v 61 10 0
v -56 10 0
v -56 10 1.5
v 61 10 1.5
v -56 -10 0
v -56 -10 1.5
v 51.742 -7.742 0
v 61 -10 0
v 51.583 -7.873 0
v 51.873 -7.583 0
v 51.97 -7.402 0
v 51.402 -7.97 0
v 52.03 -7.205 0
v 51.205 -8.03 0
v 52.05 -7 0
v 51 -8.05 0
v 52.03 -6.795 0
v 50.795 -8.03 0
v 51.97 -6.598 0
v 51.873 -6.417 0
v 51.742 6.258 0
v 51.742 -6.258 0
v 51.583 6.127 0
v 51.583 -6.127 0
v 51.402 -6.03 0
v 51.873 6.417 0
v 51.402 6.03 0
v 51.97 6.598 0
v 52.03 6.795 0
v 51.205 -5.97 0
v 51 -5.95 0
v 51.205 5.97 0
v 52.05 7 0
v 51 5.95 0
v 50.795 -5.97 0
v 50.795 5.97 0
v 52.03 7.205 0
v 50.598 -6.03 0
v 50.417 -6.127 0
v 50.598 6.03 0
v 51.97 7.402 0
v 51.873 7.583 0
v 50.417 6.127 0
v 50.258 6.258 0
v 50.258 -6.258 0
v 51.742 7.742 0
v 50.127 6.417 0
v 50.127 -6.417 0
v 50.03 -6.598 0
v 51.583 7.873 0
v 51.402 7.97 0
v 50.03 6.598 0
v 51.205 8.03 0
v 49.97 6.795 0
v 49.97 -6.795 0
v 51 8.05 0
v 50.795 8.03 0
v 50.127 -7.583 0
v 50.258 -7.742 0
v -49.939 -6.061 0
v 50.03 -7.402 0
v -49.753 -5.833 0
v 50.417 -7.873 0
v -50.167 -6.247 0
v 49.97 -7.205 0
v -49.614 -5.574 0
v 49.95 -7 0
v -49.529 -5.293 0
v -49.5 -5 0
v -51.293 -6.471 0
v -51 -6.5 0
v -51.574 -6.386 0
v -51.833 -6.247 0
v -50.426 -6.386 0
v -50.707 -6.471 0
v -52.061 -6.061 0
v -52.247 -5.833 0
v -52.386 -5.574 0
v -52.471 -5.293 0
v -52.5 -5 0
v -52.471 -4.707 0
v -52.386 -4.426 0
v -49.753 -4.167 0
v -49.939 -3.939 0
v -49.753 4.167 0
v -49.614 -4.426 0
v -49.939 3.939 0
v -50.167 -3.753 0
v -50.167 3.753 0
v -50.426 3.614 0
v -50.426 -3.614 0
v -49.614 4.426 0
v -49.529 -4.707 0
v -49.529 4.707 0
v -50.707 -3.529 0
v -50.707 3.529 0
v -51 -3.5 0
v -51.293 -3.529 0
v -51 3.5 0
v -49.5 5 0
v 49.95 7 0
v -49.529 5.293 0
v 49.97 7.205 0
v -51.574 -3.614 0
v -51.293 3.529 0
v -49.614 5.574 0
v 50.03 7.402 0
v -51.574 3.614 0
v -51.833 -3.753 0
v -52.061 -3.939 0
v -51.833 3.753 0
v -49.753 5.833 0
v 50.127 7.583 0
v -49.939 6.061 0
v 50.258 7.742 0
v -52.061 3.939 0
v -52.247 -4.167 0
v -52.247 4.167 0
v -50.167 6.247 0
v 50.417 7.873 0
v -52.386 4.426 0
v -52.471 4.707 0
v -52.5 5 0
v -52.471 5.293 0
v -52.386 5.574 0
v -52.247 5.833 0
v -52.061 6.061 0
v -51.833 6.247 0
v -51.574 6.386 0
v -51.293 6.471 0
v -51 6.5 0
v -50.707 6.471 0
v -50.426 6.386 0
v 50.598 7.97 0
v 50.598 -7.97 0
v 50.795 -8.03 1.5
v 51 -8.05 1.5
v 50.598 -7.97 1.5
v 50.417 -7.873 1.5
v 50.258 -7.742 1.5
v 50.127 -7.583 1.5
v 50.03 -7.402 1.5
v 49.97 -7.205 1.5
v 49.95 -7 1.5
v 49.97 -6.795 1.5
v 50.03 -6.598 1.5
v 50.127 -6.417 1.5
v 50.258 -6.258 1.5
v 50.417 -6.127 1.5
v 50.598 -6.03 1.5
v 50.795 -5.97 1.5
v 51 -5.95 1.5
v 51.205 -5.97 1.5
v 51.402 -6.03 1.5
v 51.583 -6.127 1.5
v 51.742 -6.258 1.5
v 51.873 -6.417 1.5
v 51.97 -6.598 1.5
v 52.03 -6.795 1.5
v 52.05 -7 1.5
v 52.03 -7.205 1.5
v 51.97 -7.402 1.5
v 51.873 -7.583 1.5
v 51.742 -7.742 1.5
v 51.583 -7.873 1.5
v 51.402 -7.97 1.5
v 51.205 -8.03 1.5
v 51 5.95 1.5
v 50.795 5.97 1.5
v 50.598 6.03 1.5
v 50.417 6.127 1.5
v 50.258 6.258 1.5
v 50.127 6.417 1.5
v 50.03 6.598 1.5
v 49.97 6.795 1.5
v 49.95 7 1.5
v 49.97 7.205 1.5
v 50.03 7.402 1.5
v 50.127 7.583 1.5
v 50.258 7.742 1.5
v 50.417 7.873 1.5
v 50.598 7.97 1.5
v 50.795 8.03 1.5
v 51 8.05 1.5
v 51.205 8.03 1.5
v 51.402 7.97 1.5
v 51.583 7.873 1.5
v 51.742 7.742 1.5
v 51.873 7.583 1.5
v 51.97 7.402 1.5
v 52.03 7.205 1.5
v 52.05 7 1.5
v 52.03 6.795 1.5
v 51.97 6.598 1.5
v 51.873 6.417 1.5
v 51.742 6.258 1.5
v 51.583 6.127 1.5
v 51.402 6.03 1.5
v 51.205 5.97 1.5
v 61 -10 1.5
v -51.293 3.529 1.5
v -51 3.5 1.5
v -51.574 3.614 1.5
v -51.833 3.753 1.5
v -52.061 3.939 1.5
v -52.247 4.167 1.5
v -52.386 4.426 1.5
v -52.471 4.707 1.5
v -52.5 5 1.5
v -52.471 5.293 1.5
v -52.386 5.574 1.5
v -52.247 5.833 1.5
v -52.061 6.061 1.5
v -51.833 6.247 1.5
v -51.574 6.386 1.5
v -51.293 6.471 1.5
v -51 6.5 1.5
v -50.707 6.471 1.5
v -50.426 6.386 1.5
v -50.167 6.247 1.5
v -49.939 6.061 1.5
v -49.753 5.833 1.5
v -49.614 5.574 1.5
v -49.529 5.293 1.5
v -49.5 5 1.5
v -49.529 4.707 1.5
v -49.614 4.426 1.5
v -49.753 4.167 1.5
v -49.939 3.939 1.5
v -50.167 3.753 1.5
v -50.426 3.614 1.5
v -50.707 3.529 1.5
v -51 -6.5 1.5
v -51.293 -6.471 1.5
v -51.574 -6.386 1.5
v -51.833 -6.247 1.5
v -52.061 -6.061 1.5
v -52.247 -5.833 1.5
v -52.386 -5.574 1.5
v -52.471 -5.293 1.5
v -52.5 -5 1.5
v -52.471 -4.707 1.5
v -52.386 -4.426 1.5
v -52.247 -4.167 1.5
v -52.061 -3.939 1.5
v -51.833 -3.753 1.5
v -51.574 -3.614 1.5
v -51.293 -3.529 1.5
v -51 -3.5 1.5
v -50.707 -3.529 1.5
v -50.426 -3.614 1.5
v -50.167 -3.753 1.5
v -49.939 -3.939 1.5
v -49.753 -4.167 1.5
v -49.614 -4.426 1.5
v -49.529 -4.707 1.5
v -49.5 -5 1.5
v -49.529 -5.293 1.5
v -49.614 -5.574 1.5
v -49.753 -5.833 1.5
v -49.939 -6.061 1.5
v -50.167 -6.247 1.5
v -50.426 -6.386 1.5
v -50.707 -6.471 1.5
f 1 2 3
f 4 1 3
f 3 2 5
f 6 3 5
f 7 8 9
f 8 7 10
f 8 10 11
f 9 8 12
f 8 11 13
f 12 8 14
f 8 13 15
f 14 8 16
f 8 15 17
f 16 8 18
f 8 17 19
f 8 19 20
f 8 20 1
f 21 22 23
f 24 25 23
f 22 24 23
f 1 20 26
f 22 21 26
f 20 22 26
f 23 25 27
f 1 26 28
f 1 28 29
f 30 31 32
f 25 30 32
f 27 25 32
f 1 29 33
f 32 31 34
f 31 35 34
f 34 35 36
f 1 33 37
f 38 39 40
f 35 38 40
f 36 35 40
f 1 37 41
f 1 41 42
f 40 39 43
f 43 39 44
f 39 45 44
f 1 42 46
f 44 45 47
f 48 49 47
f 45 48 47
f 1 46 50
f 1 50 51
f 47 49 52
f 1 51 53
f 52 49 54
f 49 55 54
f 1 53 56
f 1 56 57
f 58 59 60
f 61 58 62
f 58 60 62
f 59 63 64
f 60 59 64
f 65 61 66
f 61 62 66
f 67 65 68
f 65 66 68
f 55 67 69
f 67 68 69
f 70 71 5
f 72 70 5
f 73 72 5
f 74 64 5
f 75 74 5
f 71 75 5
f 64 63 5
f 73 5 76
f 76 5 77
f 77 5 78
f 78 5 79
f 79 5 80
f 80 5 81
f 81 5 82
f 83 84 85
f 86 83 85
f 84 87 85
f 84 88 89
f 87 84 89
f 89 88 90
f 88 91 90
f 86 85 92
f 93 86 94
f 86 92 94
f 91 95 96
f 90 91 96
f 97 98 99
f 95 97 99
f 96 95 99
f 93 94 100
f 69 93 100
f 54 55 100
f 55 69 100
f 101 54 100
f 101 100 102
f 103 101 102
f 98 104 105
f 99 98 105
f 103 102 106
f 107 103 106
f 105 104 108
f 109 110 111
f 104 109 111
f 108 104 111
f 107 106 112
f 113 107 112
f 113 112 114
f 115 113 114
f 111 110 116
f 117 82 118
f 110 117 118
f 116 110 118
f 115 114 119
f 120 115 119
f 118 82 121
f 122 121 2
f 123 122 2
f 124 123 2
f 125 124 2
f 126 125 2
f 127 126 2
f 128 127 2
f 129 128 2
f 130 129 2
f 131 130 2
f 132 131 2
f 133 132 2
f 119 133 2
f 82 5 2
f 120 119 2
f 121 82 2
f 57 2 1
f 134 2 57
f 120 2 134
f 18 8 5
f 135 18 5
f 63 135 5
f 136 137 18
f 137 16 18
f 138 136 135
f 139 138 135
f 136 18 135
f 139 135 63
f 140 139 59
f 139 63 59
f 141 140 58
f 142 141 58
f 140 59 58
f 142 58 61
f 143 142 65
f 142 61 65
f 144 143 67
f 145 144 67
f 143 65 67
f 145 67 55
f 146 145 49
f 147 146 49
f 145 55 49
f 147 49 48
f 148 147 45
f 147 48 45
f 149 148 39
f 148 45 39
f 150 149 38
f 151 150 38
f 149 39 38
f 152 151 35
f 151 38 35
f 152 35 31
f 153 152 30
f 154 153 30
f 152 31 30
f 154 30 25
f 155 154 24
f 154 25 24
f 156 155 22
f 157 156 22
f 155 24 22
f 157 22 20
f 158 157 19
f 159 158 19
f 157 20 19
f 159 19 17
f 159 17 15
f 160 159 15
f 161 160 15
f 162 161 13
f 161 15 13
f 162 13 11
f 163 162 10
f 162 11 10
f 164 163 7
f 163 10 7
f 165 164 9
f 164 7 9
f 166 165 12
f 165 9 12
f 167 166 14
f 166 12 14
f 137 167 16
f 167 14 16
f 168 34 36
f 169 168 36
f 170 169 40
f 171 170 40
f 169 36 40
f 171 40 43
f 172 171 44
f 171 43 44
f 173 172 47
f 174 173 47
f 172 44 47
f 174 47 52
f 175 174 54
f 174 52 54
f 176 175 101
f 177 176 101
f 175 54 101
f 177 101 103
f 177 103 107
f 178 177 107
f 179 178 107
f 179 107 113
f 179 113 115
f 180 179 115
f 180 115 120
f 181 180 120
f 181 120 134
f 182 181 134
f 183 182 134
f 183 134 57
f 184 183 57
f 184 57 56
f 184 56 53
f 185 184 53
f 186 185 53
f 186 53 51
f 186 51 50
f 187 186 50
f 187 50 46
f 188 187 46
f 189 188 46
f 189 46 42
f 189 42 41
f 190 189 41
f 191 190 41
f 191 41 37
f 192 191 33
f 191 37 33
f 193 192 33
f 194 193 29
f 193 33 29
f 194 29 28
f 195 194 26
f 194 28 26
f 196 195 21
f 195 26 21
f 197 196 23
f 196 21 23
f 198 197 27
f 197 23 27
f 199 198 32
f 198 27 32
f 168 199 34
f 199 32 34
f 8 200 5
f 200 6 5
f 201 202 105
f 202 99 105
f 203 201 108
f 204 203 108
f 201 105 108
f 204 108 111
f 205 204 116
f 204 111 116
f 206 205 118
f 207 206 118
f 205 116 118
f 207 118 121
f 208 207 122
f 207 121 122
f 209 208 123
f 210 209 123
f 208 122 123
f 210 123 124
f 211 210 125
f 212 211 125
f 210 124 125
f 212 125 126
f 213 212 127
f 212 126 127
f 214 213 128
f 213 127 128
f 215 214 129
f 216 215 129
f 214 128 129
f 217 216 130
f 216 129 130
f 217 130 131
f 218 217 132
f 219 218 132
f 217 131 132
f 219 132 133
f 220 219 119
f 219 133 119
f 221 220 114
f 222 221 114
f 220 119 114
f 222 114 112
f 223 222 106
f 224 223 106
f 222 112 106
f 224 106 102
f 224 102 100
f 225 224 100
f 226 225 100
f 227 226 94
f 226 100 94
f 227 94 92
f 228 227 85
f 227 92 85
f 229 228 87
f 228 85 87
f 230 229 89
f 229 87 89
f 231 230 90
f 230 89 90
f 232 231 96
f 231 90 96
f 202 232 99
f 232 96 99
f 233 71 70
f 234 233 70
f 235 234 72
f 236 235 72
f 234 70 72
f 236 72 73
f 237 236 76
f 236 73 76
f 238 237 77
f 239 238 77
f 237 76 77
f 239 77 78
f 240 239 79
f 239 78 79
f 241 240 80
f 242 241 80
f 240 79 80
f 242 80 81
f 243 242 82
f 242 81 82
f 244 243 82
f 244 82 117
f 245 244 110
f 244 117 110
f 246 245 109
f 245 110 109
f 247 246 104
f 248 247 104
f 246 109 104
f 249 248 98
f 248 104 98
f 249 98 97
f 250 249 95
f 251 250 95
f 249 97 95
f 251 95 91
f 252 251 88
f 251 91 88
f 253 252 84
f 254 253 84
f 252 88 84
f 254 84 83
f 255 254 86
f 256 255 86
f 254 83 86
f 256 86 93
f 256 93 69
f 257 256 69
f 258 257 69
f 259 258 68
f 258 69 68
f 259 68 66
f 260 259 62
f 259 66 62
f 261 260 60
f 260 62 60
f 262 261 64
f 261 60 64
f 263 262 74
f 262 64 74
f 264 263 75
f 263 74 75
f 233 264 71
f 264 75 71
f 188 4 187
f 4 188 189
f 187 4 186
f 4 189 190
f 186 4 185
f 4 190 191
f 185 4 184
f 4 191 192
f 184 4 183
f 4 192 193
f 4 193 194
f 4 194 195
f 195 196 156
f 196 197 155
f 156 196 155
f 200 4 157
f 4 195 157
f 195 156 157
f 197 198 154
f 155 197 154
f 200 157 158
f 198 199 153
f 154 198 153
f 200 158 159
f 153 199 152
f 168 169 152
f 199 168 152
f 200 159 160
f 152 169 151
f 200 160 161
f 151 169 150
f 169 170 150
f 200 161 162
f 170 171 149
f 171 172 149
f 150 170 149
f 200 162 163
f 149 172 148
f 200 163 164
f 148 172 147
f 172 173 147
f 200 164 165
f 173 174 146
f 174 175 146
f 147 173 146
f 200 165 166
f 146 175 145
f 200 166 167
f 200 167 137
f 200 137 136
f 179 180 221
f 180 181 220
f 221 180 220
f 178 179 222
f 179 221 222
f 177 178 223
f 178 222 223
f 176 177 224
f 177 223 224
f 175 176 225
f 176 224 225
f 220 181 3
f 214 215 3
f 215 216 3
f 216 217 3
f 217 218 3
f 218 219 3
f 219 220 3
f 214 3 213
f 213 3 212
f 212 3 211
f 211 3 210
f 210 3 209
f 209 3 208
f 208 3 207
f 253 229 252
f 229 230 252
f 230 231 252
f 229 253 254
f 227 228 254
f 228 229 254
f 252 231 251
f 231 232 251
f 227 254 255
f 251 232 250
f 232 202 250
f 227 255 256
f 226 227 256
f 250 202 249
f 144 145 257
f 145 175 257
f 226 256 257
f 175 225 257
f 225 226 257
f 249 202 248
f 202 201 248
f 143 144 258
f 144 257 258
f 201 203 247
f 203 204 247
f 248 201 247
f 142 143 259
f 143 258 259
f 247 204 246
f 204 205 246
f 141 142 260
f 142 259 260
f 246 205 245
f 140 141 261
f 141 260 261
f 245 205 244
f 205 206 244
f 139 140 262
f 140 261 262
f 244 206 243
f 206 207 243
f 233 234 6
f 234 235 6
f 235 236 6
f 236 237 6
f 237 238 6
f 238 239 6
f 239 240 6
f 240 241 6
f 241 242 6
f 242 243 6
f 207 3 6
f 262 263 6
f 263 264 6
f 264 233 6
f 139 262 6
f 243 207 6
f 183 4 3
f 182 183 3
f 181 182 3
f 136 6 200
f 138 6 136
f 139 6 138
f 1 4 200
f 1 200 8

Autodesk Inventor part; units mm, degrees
ref_plane "YZ Plane" through (0, 0, 0) normal (1, 0, 0) x (0, 1, 0)
ref_plane "XZ Plane" through (0, 0, 0) normal (0, 1, 0) x (-1, 0, 0)
ref_plane "XY Plane" through (0, 0, 0) normal (0, 0, 1) x (1, 0, 0)
sketch "スケッチ1" plane through (0, 0, 0) normal (0, 0, 1) x (1, 0, 0)
  line L0 (56, 10) -> (-56, 10)
  line L1 (-56, 10) -> (-56, -10)
  line L2 (-56, -10) -> (56, -10)
  line L3 (56, -10) -> (56, 10)
  line L4 (56, 10) -> (-56, -10) construction
  line L5 (-56, 10) -> (56, -10) construction
  point P0 (0, 0)
  dimension "d0" = 112
  dimension "d1" = 20
extrude "押し出し1" add sketch "スケッチ1" along normal blind 1.5
sketch "スケッチ3" plane through (0, 0, 1.5) normal (0, 0, 1) x (1, 0, 0)
  line L0 (56, 10) -> (-56, 10) projected
  line L1 (-56, 10) -> (-56, -10) projected
  point P0 (0, 0)
  point P1 (-51, 5)
  point P2 (-51, -5)
  dimension "d10" = 10
  dimension "d11" = 5
  dimension "d12" = 5
hole "穴1" at (-51, 5, 1.5) at (-51, -5, 1.5) direction (0, 0, -1) diameter 3 end through all
sketch "スケッチ5" plane through (0, 0, 1.5) normal (0, 0, 1) x (1, 0, 0)
  point P0 (0, 0)
  point P1 (51, 7)
  point P2 (51, -7)
hole "穴3" at (51, 7, 1.5) at (51, -7, 1.5) direction (0, 0, -1) diameter 2.1 end through all
sketch "スケッチ6" plane through (56, -10, 0) normal (1, 0, 0) x (0, 0, -1)
  line L0 (-1.5, 0) -> (0, 0)
  line L1 (0, 0) -> (0, 20)
  line L2 (0, 20) -> (-1.5, 20)
  line L3 (-1.5, 20) -> (-1.5, 0)
  point P0 (0, 10)
  dimension "d36" = 1.5
  dimension "d37" = 20
extrude "押し出し3" add sketch "スケッチ6" along normal blind 5
properties part number "pre" material "アルミニウム 5052 H32"
